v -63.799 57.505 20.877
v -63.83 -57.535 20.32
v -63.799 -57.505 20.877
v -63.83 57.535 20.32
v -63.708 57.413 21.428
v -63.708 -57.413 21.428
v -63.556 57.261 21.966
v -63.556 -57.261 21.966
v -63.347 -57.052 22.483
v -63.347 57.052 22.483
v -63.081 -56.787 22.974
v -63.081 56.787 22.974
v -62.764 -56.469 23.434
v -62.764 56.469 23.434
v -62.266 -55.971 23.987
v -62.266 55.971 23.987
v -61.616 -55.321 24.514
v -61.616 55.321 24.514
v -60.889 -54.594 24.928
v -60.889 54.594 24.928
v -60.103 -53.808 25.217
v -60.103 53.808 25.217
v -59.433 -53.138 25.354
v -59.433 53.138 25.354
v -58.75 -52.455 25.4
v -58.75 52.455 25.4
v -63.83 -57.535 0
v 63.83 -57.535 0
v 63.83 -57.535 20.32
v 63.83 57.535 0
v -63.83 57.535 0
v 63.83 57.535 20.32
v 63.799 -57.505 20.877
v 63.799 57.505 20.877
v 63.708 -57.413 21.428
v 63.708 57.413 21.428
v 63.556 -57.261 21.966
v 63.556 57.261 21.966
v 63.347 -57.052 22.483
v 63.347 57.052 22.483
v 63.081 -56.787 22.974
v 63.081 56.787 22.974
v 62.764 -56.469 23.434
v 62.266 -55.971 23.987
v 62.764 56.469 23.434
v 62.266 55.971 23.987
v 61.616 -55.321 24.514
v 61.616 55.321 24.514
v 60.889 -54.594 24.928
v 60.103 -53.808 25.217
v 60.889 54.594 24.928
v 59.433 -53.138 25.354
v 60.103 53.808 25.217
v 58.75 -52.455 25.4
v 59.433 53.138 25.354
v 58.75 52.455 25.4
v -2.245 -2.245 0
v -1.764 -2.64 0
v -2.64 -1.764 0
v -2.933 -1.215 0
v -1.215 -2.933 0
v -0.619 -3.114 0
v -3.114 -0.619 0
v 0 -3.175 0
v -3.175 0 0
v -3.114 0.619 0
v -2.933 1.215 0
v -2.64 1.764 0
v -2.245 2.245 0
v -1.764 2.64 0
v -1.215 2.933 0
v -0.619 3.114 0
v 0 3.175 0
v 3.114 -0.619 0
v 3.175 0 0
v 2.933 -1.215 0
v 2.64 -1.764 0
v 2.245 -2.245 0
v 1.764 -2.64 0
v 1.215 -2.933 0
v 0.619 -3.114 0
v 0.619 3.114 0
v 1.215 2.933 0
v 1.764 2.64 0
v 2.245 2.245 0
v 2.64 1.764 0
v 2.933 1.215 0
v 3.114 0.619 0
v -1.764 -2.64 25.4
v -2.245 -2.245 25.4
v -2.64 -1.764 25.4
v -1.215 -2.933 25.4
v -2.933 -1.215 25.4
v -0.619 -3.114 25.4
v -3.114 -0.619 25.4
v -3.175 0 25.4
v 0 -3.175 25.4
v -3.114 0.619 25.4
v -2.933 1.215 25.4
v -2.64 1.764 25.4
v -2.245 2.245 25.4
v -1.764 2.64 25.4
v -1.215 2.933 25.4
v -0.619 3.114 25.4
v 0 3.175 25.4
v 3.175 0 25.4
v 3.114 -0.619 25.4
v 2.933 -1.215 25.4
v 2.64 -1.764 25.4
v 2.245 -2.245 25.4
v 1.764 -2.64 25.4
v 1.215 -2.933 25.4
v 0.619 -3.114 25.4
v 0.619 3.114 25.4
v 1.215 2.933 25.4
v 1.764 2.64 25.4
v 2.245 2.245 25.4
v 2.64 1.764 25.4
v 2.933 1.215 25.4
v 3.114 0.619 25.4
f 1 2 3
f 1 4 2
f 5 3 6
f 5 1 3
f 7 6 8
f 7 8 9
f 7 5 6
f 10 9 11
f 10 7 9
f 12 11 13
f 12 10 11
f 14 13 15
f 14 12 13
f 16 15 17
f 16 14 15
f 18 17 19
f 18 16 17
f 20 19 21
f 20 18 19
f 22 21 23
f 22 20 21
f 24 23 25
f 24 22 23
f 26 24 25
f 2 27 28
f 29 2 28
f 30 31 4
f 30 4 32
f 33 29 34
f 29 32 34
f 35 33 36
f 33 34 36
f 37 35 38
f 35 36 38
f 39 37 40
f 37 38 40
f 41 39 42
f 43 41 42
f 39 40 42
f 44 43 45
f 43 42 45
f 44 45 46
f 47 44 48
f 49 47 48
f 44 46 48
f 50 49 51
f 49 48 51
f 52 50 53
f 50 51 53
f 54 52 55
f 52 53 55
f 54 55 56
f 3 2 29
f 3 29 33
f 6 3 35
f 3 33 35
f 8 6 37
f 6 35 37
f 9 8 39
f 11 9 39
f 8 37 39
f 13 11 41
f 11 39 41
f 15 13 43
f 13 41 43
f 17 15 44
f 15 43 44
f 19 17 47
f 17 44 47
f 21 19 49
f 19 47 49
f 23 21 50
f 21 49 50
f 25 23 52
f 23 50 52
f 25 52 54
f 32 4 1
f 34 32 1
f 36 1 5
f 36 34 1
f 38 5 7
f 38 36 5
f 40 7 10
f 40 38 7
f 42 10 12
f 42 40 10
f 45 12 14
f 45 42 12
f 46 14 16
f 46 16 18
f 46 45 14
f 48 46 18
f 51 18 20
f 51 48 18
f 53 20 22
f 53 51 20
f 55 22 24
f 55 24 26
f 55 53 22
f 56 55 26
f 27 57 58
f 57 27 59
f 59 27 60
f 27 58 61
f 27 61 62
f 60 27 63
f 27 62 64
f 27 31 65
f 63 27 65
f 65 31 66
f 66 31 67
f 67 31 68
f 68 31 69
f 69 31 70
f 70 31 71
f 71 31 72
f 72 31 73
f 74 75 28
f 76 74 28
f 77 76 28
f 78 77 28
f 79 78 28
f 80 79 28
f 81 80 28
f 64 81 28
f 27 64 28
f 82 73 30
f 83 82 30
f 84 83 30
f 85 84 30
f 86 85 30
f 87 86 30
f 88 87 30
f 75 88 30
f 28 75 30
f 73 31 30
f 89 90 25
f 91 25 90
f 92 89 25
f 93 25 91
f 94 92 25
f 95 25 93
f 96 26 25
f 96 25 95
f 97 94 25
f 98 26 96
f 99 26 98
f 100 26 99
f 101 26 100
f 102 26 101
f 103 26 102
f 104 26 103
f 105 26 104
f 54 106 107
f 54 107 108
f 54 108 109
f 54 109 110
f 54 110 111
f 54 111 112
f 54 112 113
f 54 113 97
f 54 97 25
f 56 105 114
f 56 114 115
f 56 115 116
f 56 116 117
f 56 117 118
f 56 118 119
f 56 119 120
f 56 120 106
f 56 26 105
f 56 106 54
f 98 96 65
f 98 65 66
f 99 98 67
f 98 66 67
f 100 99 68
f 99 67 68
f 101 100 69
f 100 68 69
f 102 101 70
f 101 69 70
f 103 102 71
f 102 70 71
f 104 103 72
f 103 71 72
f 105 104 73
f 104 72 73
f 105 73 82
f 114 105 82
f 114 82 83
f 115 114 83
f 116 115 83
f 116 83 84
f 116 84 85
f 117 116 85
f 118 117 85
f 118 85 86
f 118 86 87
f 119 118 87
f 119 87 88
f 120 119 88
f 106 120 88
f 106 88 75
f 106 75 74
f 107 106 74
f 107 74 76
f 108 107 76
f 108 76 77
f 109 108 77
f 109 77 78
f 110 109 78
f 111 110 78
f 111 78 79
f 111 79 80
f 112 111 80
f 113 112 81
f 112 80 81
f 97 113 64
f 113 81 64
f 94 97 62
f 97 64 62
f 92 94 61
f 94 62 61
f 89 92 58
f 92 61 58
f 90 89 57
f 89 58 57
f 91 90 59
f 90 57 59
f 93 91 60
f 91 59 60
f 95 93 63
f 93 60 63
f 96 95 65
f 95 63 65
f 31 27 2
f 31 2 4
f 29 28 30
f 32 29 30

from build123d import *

# Parameters (mm, degrees)
F0_W     = 127.66026
F0_H     = 115.070366
F1_DEPTH = 25.4
F2_R     = 5.08
F4_D     = 6.35


with BuildPart() as f1:
    # F0 (on Top) → F1 (new body)
    with BuildSketch(Plane.XY):
        Rectangle(F0_W, F0_H)
    extrude(amount=F1_DEPTH)

    # F2
    f2_edges = [f1.edges().sort_by_distance(p)[0] for p in [
        (0, -57.535183, 25.4),
        (63.83013, 0, 25.4),
        (0, 57.535183, 25.4),
        (-63.83013, 0, 25.4),
    ]]
    fillet(f2_edges, radius=F2_R)

    # F4 (through all)
    with Locations(Plane.XY.offset(25.4)):
        with Locations((0, 0)):
            Hole(F4_D / 2)


solid = f1.part
